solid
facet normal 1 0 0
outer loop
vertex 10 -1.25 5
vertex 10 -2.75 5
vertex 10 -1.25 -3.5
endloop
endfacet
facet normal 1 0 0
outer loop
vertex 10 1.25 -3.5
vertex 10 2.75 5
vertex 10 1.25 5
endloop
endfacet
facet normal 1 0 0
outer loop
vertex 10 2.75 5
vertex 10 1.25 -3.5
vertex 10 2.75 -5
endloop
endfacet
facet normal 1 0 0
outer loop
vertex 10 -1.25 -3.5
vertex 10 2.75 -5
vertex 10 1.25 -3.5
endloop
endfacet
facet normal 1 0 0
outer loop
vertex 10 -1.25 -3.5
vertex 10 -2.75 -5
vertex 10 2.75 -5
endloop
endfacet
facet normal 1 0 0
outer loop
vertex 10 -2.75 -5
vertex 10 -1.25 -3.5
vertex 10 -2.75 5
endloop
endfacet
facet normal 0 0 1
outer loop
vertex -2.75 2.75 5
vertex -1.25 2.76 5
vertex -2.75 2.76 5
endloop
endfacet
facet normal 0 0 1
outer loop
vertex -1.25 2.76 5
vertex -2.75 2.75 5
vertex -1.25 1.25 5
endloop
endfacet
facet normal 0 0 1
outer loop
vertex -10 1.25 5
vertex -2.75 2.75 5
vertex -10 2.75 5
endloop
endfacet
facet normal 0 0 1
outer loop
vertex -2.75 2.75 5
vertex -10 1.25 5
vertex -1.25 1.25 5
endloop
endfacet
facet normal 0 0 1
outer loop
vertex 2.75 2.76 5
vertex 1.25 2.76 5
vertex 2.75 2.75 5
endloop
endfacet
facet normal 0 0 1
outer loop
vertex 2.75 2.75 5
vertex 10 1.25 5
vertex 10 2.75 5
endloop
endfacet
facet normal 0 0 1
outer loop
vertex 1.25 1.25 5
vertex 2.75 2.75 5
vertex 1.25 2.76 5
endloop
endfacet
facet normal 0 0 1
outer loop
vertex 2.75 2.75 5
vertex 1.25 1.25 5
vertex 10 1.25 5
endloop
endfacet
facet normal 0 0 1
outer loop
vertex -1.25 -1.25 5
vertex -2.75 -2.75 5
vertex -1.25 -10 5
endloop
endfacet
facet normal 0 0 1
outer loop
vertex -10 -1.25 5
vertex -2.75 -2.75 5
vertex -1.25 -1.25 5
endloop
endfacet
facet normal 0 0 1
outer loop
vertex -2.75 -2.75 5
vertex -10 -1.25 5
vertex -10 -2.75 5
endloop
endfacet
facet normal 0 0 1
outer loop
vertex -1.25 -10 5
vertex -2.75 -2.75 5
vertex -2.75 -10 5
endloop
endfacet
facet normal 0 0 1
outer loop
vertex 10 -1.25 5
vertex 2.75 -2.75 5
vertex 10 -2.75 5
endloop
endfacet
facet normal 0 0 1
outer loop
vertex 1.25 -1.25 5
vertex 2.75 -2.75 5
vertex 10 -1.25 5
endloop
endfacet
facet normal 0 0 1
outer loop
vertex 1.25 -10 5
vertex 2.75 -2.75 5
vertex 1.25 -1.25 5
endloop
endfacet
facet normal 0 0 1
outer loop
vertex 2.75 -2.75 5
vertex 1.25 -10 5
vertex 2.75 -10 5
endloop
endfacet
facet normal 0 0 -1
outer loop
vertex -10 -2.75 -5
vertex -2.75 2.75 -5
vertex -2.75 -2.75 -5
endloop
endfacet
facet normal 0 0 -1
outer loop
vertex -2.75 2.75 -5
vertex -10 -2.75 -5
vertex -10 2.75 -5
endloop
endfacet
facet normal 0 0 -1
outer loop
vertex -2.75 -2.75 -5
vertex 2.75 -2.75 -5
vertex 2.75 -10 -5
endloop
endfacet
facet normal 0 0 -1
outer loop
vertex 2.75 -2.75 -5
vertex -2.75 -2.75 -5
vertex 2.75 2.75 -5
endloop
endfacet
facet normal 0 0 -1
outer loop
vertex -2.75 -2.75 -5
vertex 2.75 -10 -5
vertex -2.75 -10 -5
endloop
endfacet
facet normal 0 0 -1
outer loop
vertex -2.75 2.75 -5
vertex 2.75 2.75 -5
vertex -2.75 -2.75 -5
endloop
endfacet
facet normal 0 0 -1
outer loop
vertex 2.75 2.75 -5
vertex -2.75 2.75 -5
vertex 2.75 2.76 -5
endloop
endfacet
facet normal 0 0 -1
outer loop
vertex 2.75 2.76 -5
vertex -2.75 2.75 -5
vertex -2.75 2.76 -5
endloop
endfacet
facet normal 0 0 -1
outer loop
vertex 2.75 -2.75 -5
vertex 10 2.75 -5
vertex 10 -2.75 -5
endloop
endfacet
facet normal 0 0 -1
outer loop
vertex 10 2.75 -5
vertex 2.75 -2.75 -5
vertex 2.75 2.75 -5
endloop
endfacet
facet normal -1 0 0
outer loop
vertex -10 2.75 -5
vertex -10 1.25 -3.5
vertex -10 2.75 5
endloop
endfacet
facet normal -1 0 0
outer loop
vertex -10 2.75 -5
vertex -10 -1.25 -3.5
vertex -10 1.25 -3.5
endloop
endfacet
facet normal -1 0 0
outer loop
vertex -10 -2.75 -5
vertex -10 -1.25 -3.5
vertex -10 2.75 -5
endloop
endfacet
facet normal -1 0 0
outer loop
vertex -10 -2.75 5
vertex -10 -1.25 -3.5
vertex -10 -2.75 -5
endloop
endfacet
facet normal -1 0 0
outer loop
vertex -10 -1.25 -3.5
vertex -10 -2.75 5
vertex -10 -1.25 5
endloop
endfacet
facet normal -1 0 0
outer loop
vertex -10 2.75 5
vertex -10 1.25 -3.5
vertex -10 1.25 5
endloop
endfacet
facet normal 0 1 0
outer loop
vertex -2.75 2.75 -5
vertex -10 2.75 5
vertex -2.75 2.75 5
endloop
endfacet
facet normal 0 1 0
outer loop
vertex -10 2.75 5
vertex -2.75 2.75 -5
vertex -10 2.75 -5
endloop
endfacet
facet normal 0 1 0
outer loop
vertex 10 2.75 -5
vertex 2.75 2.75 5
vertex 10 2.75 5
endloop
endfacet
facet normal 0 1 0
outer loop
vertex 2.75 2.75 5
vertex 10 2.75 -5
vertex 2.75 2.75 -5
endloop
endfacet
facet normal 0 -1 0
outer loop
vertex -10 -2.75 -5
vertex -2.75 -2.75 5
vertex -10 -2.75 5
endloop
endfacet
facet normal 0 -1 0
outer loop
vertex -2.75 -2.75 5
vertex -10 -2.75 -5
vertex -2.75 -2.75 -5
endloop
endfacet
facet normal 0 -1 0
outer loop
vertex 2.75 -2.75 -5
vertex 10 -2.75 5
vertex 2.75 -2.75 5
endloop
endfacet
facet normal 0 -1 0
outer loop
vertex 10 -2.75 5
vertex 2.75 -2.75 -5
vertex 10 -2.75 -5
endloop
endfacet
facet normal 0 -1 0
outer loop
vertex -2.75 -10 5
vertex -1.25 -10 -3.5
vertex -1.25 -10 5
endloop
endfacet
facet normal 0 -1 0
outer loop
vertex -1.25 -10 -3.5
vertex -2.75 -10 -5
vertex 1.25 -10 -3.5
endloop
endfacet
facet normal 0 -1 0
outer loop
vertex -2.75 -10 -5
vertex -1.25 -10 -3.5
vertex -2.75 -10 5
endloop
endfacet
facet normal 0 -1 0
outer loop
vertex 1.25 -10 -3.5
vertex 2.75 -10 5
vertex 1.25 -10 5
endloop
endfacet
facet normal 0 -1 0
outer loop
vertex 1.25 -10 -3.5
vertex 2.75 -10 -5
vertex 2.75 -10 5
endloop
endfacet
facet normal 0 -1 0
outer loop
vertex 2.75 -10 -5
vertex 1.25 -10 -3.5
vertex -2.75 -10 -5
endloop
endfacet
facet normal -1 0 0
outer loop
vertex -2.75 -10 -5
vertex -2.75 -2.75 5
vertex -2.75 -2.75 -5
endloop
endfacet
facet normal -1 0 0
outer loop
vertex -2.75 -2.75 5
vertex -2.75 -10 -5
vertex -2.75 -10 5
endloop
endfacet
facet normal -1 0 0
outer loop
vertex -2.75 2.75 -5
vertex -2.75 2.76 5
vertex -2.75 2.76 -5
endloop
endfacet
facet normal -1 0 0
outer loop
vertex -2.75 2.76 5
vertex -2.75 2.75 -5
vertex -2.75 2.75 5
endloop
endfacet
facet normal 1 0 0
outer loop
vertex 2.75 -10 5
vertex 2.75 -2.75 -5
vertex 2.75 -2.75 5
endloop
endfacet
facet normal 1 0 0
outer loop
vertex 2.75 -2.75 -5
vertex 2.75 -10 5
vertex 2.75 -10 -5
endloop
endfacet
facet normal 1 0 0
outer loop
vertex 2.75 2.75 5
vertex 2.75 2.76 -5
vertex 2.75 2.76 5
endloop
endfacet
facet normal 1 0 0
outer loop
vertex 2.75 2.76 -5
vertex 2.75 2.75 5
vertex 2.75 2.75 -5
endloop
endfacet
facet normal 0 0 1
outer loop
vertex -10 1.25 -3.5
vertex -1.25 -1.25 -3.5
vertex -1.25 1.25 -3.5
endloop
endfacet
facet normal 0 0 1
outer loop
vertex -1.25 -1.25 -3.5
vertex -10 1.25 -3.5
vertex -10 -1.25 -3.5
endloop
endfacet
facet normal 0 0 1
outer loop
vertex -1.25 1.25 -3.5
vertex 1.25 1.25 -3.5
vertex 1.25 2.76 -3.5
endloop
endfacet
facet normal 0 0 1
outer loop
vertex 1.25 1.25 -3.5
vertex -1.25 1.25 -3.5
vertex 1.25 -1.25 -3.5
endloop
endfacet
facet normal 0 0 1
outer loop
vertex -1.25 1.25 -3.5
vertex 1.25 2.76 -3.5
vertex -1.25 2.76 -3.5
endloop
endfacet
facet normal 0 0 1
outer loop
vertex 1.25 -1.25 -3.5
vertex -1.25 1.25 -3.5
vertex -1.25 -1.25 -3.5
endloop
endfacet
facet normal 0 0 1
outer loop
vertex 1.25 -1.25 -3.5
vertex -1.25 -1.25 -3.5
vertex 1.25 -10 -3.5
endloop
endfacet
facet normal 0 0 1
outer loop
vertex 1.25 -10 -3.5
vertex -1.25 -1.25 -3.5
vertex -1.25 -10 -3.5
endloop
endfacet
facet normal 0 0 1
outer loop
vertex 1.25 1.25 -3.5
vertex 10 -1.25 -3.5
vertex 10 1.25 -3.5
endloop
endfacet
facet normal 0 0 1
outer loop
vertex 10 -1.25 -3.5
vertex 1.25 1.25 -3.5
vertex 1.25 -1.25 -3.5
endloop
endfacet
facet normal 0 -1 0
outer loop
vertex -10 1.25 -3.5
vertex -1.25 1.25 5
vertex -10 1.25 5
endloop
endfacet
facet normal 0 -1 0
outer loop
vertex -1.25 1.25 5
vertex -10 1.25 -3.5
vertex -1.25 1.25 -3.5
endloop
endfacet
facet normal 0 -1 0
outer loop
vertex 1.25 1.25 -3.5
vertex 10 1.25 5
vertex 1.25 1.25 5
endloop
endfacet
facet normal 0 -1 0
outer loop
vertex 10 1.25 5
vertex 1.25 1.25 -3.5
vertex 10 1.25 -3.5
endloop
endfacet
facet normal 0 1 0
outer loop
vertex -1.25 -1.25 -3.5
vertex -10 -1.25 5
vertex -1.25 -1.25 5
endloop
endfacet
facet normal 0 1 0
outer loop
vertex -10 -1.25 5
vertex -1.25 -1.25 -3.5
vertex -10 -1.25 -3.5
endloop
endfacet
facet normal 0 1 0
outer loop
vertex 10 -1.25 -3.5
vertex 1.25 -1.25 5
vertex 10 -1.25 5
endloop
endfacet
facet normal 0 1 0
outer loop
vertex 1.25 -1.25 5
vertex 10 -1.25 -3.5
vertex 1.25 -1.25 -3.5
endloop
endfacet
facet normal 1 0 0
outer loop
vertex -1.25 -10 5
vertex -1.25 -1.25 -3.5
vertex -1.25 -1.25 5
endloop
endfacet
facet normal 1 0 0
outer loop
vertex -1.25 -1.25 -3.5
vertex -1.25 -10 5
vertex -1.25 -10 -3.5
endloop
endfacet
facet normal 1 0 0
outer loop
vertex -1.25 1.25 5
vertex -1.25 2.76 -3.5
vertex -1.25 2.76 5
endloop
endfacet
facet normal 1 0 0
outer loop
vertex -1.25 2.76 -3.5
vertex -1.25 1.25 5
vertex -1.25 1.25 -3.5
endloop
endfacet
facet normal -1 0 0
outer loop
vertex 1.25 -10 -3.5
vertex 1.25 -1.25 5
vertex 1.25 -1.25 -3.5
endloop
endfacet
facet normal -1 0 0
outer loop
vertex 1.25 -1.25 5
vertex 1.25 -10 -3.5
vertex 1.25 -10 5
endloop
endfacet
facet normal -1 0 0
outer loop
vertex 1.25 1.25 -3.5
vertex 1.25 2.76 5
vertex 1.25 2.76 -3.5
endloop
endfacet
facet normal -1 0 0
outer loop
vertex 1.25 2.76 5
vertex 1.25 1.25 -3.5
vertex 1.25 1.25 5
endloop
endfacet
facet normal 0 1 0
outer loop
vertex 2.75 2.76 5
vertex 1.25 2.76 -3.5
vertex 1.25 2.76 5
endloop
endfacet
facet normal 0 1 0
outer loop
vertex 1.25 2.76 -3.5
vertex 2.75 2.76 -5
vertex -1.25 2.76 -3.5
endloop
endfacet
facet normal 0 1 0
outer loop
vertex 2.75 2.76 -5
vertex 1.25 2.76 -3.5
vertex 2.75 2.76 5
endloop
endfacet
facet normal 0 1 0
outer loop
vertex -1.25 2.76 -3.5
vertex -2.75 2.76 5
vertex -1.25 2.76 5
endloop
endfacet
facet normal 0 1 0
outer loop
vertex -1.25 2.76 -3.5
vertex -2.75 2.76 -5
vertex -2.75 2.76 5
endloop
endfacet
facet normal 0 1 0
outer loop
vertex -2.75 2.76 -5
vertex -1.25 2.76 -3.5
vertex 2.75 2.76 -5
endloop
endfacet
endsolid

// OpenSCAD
wall_thickness = 1.5; 
wood_thickness = 2;
smidge = .01;

length = 20;
height = 10;
spacing = length + 10;

gap_width = wood_thickness + 0.5;
width = (wall_thickness * 2) + gap_width;
gap_length = length + 2;
one_arm = length/2 - width/2;

module solid(rotation) {
  rotate(rotation) {
    cube([length, width, height], center = true);
  }
}

module hollow(rotation) {
  rotate(rotation) {
    cube([gap_length, gap_width, height], center = true);
  }
}

module outside() {
  union() {
    solid(0);
    solid(90);
  }
}
 
module inside() {
  union() {
    translate([0, 0, wall_thickness]) {
      hollow(0); 
      hollow(90);
    }
  }
}

module bracket() {
  difference() {
    outside();
    inside();
  }
}

module t_bracket_slicer() {
  translate([-length/2, gap_width/2 + wall_thickness + smidge, - height/2 - smidge]) { 
    cube([length + smidge, one_arm, height + (smidge)], center = false);
  }
}

difference() {
  bracket();
  t_bracket_slicer();
}
